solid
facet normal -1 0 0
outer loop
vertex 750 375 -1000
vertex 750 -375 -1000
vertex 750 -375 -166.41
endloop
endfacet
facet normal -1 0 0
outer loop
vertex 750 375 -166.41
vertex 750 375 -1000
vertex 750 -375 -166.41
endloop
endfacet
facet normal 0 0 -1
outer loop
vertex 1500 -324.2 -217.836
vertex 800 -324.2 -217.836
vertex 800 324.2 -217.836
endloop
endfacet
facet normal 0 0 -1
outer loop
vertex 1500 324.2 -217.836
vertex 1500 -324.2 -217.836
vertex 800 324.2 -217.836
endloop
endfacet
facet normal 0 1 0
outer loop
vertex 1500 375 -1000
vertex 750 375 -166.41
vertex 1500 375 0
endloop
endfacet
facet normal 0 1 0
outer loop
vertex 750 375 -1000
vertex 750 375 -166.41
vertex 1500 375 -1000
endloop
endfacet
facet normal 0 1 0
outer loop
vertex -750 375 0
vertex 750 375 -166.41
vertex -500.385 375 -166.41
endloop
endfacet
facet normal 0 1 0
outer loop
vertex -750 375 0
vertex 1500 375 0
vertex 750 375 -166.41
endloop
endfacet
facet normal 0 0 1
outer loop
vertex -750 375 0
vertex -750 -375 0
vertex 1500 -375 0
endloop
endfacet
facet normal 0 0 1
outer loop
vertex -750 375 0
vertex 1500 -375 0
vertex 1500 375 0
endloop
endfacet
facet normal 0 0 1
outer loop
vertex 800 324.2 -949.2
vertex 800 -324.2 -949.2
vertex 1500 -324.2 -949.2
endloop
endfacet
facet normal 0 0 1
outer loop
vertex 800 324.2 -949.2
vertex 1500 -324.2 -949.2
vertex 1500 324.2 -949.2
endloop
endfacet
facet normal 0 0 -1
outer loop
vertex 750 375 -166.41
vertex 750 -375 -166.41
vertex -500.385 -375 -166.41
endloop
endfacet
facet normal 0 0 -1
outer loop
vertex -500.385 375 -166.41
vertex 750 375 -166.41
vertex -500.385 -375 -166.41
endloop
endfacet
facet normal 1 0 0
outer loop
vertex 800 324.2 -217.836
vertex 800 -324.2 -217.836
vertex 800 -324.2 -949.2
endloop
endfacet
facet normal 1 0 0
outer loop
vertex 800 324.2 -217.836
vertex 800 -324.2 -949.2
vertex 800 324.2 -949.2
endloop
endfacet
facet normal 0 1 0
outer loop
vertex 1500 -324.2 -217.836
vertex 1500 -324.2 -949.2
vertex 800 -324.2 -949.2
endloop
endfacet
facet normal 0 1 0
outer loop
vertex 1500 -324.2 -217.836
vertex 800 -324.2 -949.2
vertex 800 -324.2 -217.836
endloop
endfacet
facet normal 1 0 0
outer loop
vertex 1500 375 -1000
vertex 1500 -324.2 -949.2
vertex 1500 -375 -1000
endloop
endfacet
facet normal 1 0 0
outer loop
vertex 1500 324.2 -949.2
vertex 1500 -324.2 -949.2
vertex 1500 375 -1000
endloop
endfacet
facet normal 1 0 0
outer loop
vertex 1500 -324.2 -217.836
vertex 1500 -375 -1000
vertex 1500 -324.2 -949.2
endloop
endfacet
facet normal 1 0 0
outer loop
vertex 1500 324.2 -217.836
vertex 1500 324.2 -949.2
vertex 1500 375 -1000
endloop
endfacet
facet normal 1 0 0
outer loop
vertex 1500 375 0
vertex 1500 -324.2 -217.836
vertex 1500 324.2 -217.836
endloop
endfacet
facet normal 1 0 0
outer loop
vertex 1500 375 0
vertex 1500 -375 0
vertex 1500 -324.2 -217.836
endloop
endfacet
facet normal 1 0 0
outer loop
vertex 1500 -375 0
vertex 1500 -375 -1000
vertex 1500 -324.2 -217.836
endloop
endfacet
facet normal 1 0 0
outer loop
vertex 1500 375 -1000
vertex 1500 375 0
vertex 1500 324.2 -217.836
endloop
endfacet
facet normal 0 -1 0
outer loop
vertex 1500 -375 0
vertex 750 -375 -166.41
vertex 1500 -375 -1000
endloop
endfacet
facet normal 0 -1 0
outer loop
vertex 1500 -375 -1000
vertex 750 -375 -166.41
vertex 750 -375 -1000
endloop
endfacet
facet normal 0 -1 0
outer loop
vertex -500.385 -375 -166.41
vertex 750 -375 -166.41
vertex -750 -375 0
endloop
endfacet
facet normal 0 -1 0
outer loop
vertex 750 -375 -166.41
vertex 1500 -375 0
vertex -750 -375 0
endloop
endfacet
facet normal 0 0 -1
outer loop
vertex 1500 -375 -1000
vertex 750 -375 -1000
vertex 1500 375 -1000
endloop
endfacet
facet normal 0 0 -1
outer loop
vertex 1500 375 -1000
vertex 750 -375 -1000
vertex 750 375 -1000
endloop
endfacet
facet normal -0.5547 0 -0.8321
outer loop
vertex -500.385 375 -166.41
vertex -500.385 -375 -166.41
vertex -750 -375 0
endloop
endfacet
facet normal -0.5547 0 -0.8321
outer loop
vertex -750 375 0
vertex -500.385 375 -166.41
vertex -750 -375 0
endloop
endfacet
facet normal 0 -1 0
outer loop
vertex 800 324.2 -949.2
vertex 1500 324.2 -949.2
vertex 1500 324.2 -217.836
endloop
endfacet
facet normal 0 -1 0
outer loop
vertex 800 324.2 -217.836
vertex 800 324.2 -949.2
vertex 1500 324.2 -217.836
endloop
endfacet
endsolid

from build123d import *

# Parameters (mm, degrees)
F0_W     = 1500
F0_H     = 750
F1_DEPTH = 1000
F3_DEPTH = 750
F4_DEPTH = 750
F6_DEPTH = 750
F8_W     = 648.4
F8_H     = 731.364360714
F9_DEPTH = 700


with BuildPart() as f1:
    # F0 (on Top) → F1 (new body)
    with BuildSketch(Plane.XY):
        Rectangle(F0_W, F0_H)
    extrude(amount=-F1_DEPTH)

    # F2 (on face) → F3 (cut)
    with BuildSketch(Plane.XZ.offset(375)):
        Polygon((-750, -1000), (750, -1000), (-750, 0), align=None)
    extrude(amount=-F3_DEPTH, mode=Mode.SUBTRACT)

    # F4 (add): a face of the model
    f4_faces = [f1.faces().sort_by_distance(p)[0] for p in [
        (750, 0, -500),
    ]]
    extrude(f4_faces, amount=F4_DEPTH)

    # F5 (on face) → F6 (cut)
    with BuildSketch(Plane.XZ.offset(375)):
        Polygon((750, -166.4100588676), (-500.3849116986, -166.4100588676), (750, -1000), align=None)
        Polygon((750, -1000), (-500.3849116986, -166.4100588676), (-500.3849116986, -1000), align=None)
    extrude(amount=-F6_DEPTH, mode=Mode.SUBTRACT)

    # F8 (on face) → F9 (cut)
    with BuildSketch(Plane.YZ.offset(1500)):
        with Locations((0, -583.517819643)):
            Rectangle(F8_W, F8_H)
    extrude(amount=-F9_DEPTH, mode=Mode.SUBTRACT)


solid = f1.part
